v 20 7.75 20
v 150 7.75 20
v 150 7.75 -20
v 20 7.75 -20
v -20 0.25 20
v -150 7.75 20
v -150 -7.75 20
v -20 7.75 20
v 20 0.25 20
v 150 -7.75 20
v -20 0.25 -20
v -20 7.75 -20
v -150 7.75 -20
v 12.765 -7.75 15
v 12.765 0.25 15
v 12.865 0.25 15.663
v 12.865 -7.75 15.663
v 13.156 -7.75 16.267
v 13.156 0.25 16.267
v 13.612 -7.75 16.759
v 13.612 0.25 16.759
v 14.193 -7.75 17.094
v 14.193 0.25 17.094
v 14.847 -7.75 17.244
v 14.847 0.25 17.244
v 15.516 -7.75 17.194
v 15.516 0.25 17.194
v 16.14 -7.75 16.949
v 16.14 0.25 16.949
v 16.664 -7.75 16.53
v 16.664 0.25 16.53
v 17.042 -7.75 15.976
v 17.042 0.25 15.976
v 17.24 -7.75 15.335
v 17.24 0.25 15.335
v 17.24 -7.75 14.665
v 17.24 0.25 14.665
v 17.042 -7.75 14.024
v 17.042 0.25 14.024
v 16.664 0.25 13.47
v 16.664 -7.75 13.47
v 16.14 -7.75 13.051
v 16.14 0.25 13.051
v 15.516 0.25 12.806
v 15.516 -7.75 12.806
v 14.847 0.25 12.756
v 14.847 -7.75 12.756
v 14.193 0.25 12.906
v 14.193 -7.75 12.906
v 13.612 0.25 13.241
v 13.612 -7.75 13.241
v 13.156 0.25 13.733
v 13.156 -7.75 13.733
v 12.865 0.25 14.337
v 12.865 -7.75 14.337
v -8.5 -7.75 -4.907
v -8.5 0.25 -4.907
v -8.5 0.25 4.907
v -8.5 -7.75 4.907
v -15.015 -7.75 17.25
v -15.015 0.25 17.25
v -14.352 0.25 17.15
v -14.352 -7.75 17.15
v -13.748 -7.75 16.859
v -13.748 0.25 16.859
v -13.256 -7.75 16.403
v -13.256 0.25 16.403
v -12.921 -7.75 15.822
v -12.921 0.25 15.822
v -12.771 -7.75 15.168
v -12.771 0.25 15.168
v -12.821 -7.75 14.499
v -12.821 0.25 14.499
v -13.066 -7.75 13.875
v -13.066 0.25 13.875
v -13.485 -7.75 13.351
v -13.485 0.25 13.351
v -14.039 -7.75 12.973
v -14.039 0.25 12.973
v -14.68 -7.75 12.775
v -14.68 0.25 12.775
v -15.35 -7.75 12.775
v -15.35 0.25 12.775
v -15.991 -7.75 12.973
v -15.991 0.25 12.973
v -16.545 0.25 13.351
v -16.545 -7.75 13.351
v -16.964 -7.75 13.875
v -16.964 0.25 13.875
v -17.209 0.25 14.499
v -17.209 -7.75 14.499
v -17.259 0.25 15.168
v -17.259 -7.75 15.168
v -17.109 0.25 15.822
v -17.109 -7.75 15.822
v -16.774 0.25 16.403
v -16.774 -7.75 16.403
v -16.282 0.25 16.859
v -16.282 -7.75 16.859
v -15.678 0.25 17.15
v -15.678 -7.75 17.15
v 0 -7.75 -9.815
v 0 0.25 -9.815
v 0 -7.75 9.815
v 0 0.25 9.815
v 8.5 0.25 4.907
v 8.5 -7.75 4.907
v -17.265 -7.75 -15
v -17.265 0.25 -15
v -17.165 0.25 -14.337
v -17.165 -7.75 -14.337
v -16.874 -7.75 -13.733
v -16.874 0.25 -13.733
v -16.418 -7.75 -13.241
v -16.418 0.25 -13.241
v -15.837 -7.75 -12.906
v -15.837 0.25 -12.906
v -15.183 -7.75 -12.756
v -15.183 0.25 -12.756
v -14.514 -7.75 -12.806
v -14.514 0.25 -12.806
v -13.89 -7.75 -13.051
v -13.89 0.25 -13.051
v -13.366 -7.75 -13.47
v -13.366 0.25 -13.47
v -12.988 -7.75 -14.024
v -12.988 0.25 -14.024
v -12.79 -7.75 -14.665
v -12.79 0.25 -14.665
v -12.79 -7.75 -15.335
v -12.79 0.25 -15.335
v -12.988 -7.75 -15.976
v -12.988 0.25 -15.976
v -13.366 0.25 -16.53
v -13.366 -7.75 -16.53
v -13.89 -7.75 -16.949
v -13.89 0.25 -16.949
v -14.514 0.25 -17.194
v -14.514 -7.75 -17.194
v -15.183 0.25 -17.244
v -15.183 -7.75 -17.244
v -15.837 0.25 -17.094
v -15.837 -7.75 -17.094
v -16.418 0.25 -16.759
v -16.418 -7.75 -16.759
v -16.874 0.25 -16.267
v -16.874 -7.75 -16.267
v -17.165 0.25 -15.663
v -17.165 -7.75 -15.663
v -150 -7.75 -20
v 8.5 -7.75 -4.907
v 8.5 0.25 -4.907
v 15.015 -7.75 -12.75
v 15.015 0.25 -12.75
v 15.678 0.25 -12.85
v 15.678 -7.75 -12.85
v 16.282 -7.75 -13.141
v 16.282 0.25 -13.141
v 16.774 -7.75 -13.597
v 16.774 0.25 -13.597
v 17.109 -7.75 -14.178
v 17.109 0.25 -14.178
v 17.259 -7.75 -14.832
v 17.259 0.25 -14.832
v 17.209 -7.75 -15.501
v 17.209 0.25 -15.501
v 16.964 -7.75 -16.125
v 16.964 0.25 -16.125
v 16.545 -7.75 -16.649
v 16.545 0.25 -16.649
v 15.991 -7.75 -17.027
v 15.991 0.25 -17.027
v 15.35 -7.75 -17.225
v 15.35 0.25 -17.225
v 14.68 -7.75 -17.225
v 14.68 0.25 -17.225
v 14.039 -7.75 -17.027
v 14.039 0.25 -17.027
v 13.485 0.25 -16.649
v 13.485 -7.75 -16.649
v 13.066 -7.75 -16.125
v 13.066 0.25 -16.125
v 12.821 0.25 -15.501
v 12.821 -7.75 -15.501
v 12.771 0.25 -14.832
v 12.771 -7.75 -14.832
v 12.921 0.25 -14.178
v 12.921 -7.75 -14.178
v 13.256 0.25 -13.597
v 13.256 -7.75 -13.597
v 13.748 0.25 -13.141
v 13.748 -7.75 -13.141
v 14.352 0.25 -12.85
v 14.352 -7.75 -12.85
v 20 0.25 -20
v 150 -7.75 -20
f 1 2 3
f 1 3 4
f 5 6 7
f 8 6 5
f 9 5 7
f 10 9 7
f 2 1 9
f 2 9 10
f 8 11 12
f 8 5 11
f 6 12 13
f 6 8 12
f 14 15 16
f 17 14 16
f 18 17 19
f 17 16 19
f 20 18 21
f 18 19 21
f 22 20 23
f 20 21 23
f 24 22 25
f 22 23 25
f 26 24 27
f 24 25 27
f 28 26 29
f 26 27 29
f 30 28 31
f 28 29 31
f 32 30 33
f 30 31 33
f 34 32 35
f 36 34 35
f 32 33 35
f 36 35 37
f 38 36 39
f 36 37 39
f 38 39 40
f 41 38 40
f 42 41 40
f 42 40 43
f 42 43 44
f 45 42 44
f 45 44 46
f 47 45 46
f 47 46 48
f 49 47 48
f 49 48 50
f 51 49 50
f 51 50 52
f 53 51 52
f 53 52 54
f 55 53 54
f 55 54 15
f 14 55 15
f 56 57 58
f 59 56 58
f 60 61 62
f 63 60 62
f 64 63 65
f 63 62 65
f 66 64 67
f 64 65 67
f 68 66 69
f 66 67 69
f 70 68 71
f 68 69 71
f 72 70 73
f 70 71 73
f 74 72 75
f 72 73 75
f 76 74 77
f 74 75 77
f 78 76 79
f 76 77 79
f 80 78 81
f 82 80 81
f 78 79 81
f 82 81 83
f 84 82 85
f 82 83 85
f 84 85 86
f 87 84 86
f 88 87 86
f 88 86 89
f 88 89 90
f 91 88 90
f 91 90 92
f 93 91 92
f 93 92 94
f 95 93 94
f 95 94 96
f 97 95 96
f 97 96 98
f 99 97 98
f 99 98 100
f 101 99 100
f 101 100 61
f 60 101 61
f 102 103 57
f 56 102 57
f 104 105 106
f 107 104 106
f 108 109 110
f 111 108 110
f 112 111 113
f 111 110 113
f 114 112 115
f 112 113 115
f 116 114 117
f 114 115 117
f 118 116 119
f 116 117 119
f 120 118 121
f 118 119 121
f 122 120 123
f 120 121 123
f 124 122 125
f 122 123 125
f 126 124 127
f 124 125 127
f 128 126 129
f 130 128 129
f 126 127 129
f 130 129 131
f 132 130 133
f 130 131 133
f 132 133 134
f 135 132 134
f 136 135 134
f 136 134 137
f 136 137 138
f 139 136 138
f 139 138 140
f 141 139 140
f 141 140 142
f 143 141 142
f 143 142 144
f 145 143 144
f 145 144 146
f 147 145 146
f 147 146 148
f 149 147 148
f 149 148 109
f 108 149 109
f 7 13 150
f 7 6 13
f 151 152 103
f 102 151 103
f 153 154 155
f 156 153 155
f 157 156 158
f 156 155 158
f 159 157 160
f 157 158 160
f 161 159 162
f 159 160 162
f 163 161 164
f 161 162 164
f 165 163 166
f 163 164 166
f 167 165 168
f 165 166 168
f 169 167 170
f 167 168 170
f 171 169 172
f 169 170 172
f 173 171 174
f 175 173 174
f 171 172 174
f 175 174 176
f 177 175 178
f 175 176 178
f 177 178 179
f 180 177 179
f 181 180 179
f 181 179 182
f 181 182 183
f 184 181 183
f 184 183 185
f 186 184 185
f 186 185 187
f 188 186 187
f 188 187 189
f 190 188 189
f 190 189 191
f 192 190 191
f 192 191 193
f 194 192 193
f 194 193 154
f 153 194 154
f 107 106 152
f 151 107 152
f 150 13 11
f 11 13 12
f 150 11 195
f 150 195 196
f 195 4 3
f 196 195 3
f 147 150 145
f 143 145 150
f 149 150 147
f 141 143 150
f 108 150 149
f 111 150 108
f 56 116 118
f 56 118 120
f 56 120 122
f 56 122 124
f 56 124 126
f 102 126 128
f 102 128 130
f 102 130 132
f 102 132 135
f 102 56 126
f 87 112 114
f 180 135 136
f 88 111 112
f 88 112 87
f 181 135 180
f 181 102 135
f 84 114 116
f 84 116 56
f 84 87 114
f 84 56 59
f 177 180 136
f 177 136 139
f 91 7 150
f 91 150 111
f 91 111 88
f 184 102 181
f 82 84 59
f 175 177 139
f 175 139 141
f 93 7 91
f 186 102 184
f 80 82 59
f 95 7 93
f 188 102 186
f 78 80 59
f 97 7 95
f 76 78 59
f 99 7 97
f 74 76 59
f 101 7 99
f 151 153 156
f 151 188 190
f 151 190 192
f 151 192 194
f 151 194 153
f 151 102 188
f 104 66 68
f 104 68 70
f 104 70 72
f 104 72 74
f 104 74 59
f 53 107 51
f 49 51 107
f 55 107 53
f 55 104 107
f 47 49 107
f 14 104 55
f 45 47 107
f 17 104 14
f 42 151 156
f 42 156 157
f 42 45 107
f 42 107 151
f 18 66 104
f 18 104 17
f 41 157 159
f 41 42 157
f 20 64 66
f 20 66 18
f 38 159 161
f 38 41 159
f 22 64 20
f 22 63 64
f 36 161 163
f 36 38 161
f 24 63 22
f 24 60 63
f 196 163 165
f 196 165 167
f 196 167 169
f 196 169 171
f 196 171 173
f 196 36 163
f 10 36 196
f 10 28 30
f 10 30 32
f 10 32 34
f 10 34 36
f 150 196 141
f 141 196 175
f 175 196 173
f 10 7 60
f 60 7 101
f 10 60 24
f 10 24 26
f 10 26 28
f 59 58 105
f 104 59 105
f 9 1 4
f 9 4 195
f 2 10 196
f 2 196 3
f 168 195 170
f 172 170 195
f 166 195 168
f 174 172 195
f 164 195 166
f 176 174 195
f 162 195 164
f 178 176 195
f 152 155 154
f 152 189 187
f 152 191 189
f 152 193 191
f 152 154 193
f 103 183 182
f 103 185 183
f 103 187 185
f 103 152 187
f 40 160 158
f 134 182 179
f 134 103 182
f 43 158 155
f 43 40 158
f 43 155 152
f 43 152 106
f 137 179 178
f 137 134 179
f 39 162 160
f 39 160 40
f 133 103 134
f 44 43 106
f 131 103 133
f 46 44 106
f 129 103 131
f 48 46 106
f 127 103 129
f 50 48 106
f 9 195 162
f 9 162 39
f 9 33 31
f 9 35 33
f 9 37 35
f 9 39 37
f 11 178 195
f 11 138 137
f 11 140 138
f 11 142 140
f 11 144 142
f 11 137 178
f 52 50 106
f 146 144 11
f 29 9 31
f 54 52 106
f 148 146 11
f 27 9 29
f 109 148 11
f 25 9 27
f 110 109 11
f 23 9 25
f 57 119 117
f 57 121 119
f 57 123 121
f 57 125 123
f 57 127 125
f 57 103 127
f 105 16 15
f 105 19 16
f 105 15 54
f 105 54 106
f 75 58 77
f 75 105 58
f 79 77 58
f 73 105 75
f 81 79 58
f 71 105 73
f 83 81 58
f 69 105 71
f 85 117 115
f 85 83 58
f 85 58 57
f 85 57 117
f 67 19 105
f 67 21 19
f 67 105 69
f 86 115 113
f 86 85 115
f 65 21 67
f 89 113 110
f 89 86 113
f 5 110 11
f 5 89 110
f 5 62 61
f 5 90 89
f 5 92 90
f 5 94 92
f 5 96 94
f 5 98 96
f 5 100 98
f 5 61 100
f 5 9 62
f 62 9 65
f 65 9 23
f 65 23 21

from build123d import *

# Parameters (mm, degrees)
BOSS_EXTRUDE1_DEPTH = 20
SKETCH2_R           = 2.25
CUT_EXTRUDE1_DEPTH  = 40


with BuildPart() as part:
    # Sketch1 → Boss-Extrude1 (new, symmetric)
    with BuildSketch(Plane.XY):
        Polygon((-150, 7.75), (-150, -7.75), (150, -7.75), (150, 7.75), (20, 7.75), (20, 0.25), (-20, 0.25), (-20, 7.75), align=None)
    extrude(amount=BOSS_EXTRUDE1_DEPTH, both=True)

    # Sketch2 → Cut-Extrude1 (cut)
    with BuildSketch(Plane(origin=(0, 0.25, 0), x_dir=(1, 0, 0), z_dir=(0, 1, 0))):
        with Locations(Location((15.015, 15, 0), (0, 0, 270))):
            Circle(SKETCH2_R)
        with Locations(Location((-15.015, 15, 0), (0, 0, 180))):
            Circle(SKETCH2_R)
        with Locations(Location((15.015, -15, 0), (0, 0, 180))):
            Circle(SKETCH2_R)
        with Locations(Location((-15.015, -15, 0), (0, 0, 270))):
            Circle(SKETCH2_R)
        Polygon((0, -9.814954576), (8.5, -4.907477288), (8.5, 4.907477288), (0, 9.814954576), (-8.5, 4.907477288), (-8.5, -4.907477288), align=None)
    extrude(amount=-CUT_EXTRUDE1_DEPTH, mode=Mode.SUBTRACT)


solid = part.part
